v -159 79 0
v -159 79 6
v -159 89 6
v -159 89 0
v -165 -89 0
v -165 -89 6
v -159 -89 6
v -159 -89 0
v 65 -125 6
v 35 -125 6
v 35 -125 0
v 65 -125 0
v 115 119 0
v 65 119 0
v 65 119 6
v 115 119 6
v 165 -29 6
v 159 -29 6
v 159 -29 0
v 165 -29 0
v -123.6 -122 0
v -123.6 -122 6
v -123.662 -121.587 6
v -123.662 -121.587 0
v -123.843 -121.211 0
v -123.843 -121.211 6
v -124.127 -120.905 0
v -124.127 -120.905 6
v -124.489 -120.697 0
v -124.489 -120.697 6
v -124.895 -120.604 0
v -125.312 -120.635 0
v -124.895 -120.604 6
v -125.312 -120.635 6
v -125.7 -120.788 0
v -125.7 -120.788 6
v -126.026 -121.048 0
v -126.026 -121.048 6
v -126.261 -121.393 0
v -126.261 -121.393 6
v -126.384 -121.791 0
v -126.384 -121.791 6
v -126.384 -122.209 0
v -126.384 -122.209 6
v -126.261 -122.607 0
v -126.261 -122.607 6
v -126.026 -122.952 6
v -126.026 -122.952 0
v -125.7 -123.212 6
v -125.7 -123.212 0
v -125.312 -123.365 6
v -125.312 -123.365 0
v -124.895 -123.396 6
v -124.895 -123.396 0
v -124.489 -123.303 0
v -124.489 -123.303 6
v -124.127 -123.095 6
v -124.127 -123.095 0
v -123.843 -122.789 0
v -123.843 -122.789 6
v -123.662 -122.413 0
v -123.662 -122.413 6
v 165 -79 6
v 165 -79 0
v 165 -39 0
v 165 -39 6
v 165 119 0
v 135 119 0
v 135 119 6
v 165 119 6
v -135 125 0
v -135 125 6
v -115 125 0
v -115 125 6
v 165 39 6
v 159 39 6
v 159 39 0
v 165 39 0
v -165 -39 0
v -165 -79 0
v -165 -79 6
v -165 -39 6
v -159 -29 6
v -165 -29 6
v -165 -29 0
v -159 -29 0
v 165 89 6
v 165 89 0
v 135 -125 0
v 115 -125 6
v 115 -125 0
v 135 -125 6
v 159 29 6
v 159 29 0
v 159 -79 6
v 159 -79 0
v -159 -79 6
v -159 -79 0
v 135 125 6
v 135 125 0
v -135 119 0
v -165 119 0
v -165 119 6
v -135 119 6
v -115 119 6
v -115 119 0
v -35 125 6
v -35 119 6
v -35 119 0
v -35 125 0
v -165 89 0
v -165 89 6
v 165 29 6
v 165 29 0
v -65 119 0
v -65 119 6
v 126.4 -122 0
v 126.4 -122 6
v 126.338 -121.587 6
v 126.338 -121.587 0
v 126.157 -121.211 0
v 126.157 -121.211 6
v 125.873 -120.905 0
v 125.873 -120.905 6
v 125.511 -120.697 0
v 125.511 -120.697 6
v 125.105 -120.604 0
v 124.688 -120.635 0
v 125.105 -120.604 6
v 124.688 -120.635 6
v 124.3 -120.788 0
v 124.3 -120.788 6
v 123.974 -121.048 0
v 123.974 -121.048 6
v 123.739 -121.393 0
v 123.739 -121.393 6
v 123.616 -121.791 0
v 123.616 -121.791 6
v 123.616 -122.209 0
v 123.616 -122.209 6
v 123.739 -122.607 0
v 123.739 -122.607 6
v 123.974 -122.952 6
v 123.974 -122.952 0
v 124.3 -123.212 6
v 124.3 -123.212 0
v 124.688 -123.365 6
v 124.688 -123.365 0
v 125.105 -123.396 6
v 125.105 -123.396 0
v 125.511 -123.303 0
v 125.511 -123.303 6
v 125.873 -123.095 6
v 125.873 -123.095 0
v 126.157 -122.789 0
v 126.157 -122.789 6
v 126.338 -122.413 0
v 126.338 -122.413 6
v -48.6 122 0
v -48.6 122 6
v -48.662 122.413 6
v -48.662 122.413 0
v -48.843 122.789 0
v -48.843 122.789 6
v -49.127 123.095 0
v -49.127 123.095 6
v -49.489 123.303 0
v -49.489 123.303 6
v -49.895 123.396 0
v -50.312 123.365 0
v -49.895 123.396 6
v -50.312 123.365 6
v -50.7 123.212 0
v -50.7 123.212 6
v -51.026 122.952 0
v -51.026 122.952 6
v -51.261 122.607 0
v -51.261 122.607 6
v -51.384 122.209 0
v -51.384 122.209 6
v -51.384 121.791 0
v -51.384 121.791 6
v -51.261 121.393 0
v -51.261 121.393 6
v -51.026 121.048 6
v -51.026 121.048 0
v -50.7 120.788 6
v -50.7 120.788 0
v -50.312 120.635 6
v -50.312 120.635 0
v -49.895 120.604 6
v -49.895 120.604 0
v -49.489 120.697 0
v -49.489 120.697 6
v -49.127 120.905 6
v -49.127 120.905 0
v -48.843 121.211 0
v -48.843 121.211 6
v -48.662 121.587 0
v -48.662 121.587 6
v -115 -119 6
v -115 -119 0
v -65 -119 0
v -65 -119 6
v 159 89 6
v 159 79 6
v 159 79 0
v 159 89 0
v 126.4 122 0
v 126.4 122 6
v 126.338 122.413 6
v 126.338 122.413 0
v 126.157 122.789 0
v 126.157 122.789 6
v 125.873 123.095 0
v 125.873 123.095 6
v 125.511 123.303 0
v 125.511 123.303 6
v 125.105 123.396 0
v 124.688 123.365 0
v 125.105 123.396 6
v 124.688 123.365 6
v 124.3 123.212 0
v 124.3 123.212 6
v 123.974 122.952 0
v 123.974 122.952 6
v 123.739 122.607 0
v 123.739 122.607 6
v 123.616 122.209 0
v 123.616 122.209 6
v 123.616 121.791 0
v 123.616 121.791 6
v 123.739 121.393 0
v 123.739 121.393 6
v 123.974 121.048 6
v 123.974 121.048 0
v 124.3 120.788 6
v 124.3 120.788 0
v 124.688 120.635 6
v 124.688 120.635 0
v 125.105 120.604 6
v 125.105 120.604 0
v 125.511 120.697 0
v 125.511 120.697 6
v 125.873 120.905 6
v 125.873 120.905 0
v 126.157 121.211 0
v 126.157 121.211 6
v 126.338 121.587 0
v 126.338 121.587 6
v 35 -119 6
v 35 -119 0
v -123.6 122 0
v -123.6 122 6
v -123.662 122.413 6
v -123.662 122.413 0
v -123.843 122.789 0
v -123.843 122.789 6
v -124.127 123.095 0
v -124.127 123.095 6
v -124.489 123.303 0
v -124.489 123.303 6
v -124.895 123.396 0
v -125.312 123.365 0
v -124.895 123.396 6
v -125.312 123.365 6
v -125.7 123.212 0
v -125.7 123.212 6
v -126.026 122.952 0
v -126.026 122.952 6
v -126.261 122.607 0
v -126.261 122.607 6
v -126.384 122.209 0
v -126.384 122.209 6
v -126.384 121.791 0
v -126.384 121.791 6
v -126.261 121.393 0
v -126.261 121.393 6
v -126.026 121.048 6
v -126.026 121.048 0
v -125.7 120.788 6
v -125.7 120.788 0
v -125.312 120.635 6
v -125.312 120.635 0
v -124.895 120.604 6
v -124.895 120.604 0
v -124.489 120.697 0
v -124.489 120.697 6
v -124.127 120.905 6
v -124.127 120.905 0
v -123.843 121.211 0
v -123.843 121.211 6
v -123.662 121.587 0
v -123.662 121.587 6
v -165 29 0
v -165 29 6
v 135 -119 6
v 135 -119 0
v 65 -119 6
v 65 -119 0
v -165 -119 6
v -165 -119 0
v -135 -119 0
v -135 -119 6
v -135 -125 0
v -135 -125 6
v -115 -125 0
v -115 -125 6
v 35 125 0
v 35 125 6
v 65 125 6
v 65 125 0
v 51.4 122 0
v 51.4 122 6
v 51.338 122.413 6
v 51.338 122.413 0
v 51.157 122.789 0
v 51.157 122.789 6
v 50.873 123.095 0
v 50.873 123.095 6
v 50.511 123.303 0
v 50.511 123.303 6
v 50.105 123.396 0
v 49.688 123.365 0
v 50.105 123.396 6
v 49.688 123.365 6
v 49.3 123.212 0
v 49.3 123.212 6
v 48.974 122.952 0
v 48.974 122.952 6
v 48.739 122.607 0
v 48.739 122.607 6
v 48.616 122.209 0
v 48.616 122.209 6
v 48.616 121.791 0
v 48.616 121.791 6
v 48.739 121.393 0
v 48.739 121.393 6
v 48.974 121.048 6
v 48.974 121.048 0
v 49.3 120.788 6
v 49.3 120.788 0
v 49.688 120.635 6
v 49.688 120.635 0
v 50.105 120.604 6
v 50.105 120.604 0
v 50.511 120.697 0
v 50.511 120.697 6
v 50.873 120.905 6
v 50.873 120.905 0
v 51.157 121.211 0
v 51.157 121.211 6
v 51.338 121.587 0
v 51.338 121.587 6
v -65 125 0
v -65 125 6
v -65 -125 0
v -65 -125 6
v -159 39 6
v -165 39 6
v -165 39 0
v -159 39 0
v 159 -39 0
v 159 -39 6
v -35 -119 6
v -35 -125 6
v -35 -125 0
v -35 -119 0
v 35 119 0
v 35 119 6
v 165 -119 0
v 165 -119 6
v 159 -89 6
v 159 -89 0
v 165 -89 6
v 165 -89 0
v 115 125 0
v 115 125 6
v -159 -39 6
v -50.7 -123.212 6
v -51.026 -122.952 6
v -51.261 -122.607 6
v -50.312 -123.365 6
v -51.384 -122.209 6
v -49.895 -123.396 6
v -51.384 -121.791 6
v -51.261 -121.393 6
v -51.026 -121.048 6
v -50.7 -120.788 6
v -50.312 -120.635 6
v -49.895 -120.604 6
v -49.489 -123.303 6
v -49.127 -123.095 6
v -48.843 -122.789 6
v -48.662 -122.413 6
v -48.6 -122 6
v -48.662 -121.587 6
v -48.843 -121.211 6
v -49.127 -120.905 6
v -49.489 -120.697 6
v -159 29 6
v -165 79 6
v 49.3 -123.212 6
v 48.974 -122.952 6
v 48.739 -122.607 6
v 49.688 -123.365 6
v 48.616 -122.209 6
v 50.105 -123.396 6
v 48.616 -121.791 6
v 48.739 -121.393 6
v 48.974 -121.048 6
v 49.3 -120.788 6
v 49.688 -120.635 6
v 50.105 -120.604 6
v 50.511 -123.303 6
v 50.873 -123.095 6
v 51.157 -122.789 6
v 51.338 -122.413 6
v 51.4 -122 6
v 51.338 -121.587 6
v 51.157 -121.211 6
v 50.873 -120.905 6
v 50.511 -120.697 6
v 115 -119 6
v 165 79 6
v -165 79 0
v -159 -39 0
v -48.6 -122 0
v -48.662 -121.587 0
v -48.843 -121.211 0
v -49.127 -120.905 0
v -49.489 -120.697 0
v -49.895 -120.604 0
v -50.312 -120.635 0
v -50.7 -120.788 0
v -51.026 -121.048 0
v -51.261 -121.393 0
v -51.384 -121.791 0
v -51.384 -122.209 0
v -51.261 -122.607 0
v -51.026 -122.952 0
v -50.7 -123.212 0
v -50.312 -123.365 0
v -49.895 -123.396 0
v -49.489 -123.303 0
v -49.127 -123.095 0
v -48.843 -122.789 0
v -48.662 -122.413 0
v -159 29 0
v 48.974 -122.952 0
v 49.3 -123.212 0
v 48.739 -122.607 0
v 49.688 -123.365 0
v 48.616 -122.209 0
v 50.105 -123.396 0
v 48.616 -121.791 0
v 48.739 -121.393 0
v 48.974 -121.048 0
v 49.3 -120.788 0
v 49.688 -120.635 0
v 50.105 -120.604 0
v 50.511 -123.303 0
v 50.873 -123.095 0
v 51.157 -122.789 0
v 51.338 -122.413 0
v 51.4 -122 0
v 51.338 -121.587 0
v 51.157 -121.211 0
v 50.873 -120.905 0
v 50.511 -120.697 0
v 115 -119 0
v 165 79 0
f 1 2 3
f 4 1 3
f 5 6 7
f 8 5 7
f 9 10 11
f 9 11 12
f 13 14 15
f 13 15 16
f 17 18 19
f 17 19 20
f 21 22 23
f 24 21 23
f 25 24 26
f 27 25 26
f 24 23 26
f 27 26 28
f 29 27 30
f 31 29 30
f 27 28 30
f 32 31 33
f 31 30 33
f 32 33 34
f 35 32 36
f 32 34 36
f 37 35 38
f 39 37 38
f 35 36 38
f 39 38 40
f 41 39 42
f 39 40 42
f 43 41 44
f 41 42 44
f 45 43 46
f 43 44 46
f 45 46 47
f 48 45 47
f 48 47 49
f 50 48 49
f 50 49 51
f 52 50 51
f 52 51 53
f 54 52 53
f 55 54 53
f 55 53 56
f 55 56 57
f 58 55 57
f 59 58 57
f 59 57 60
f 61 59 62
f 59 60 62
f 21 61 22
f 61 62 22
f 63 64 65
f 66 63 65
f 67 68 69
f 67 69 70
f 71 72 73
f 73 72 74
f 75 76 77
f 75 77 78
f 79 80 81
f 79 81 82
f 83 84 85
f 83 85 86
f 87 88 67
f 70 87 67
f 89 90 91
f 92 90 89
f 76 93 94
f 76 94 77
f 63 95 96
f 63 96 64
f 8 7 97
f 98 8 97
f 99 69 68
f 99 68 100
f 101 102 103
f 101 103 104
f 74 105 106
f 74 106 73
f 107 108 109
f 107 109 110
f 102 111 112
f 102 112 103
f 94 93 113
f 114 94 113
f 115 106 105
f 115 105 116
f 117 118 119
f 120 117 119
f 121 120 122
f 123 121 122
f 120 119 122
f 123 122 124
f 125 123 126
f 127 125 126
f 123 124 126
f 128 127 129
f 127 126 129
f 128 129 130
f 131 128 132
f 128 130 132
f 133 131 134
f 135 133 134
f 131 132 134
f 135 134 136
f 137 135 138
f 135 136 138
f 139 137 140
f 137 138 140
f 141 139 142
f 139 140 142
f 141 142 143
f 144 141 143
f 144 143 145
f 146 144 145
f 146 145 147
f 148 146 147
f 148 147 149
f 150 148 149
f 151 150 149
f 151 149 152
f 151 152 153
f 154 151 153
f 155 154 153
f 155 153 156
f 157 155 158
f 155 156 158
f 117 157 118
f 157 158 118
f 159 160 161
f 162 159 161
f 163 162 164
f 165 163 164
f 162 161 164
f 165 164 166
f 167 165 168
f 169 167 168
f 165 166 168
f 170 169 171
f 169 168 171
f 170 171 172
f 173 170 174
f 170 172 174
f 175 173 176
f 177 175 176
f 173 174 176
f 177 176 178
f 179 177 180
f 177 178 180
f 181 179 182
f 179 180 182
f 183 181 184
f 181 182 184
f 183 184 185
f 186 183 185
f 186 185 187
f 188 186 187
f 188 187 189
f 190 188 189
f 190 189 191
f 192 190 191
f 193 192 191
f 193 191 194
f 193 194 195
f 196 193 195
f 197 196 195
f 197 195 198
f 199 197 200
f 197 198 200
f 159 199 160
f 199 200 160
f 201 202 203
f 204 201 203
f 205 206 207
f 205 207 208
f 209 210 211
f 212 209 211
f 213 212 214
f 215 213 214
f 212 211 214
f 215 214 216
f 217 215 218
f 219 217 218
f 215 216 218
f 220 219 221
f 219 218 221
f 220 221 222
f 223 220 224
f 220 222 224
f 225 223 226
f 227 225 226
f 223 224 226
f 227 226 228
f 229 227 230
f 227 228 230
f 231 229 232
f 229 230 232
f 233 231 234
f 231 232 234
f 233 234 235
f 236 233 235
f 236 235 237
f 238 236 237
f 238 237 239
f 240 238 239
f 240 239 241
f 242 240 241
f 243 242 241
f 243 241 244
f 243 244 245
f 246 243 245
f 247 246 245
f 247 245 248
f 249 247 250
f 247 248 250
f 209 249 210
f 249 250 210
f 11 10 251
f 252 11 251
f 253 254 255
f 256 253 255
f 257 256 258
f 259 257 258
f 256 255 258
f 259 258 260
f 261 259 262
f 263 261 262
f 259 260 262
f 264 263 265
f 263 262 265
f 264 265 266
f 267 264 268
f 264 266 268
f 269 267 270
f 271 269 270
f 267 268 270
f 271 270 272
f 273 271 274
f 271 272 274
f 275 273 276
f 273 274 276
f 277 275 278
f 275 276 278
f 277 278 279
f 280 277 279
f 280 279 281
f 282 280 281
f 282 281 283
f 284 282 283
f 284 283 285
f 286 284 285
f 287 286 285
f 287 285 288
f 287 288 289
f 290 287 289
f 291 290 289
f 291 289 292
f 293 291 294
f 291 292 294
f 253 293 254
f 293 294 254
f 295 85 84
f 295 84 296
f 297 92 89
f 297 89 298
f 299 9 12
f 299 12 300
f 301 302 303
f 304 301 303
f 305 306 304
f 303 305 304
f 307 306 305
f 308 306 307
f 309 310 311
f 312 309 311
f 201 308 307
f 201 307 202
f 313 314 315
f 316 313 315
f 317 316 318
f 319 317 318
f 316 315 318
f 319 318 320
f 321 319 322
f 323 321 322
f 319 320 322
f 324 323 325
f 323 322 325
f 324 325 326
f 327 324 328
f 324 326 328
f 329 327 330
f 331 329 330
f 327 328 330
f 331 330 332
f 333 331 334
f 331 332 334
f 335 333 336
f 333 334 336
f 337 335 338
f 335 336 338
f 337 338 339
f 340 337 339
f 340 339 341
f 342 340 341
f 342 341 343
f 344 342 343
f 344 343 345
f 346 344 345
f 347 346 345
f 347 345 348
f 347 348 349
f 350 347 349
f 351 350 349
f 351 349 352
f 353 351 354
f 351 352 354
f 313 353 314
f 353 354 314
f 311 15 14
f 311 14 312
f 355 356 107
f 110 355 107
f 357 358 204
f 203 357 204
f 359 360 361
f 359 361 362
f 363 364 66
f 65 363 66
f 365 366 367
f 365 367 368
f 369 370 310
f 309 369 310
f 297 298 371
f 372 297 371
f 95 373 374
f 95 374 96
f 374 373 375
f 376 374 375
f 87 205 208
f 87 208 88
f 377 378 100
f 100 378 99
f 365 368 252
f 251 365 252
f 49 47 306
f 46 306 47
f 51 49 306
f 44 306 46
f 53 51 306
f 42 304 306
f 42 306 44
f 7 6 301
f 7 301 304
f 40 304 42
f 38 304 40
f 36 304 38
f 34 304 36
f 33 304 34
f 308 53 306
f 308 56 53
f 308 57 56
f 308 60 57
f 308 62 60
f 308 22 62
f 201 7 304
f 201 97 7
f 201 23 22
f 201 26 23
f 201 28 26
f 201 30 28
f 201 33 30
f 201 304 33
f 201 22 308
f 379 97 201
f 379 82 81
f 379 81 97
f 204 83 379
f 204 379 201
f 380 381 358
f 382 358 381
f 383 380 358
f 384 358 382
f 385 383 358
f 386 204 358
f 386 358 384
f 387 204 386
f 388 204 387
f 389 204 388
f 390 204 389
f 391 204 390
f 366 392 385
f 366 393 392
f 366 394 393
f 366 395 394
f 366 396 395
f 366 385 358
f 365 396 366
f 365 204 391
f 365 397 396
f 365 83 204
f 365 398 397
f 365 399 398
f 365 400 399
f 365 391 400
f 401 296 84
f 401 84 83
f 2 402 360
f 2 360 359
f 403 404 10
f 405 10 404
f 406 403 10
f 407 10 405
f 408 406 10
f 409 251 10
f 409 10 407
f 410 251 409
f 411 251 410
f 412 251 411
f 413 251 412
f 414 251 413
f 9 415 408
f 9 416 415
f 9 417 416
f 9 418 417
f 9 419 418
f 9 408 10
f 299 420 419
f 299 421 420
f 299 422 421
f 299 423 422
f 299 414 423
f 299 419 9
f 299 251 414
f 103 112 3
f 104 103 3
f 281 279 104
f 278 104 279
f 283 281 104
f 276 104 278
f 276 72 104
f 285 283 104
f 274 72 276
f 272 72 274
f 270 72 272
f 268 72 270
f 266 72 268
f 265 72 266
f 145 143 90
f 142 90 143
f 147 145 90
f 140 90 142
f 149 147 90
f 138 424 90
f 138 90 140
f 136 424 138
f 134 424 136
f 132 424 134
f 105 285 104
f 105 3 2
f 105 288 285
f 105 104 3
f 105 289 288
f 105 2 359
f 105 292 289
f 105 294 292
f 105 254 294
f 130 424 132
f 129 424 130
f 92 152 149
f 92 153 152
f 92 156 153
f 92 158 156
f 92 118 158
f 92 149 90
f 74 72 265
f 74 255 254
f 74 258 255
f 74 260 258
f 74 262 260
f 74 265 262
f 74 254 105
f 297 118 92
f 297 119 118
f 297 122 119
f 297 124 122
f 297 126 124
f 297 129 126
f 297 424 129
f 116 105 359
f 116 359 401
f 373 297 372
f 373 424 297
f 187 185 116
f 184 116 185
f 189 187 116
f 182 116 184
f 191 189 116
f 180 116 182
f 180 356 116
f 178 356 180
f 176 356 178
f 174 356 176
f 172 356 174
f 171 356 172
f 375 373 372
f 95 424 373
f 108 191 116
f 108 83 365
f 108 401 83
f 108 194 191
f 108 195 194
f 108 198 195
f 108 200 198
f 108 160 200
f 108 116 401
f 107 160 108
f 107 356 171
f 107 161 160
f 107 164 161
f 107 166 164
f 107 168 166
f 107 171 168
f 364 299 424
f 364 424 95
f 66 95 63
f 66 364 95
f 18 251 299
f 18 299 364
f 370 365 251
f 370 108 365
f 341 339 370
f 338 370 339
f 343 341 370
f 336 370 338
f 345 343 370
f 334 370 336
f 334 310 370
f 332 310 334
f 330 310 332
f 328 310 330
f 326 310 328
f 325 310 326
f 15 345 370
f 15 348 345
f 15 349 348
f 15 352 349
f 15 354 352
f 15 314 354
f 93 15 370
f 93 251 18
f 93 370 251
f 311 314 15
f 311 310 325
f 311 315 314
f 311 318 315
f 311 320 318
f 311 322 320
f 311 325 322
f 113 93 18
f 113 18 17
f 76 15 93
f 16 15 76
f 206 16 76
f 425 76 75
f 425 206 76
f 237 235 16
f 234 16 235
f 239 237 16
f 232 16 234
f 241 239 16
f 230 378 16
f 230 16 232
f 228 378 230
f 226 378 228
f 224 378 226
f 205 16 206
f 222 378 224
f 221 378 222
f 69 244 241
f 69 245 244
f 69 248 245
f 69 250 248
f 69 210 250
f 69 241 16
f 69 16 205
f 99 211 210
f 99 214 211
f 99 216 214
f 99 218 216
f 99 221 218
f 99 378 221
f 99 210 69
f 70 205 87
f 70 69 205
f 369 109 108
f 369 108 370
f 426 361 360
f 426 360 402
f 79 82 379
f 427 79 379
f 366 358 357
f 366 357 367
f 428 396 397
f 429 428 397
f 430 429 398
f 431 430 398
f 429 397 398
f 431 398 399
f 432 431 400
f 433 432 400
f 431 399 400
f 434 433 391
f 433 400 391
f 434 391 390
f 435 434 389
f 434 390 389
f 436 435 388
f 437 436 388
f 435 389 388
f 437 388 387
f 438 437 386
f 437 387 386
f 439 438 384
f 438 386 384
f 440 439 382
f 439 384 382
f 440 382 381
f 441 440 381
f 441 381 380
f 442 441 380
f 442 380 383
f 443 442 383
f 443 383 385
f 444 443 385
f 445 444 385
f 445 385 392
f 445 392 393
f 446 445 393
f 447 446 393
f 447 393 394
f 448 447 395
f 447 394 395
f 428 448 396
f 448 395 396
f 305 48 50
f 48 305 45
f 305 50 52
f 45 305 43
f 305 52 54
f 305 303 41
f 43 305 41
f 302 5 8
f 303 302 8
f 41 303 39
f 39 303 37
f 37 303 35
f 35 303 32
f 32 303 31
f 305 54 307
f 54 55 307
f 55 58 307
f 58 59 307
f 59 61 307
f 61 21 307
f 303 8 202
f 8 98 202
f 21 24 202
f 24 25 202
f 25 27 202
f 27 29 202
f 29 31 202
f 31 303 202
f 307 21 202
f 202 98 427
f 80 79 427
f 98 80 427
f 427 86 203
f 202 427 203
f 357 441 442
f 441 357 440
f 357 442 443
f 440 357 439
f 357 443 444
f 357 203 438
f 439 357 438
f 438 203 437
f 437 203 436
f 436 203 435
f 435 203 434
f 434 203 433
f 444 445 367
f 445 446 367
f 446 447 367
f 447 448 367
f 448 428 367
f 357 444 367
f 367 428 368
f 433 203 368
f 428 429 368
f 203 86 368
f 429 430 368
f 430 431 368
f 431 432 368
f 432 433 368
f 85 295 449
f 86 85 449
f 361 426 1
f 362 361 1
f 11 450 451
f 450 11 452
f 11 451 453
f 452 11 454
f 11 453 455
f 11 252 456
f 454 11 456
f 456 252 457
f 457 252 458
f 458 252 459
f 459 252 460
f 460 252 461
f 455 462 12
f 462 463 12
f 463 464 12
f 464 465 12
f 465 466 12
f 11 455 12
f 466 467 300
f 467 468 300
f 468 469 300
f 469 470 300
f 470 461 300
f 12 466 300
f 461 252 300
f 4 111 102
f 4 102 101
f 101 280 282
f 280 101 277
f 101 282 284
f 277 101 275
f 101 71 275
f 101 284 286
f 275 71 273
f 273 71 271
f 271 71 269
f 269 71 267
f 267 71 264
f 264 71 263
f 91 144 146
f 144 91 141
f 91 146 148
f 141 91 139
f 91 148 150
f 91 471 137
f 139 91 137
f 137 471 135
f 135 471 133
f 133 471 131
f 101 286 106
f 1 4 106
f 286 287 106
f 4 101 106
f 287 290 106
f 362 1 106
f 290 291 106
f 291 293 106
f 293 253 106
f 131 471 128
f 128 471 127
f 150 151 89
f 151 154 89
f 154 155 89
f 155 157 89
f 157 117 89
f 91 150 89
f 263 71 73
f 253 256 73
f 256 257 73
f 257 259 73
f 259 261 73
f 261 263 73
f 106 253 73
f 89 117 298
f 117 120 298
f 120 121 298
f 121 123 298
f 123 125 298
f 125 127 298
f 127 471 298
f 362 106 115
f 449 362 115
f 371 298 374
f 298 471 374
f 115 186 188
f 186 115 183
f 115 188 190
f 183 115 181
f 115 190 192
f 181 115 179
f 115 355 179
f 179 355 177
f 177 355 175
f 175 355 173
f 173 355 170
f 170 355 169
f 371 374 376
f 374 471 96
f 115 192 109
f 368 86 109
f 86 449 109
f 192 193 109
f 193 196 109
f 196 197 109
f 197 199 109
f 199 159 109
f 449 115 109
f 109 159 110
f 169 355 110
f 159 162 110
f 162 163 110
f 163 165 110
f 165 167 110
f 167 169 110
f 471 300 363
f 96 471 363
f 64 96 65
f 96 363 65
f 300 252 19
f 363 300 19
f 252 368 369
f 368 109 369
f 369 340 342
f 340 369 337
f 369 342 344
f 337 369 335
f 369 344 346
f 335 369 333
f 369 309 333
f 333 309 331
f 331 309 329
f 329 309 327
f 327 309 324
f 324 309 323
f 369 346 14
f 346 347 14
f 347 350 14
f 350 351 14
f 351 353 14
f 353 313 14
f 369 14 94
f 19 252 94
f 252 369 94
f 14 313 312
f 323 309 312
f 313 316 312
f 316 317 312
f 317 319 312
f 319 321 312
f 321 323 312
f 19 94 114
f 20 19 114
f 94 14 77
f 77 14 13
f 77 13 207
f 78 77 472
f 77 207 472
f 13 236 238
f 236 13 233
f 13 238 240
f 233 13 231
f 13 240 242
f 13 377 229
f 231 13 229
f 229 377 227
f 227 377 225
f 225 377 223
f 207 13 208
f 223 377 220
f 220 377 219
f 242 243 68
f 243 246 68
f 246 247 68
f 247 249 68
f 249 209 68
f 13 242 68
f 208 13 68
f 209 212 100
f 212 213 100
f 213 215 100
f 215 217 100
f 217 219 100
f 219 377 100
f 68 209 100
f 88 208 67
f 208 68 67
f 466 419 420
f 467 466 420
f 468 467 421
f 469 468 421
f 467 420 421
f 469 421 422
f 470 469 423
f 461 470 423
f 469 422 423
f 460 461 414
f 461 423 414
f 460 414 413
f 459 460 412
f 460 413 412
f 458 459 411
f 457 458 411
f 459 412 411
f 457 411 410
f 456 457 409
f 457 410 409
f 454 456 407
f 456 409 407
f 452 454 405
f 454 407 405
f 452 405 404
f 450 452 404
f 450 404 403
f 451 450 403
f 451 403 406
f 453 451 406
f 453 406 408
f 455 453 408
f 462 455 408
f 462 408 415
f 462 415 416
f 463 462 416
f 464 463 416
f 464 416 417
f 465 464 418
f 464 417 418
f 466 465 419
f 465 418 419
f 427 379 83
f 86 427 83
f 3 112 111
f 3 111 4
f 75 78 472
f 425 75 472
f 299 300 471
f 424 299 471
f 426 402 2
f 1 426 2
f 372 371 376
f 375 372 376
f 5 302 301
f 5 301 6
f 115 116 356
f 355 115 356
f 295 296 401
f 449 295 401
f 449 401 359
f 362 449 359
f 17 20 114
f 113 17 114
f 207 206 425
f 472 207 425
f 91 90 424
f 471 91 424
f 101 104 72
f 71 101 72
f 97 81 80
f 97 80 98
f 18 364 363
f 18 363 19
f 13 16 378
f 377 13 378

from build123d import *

# Parameters (mm, degrees)
ESQUISSE1_W             = 330
ESQUISSE1_H             = 238
BOSS_EXTRU_1_DEPTH      = 6
ESQUISSE2_W             = 20
ESQUISSE2_H             = 6
ESQUISSE2_W_2           = 30
BOSS_EXTRU_2_DEPTH      = 6
ESQUISSE3_W             = 6
ESQUISSE3_H             = 10
ENL_V_MAT_EXTRU_1_DEPTH = 6
ESQUISSE4_R             = 1.4
ENL_V_MAT_EXTRU_2_DEPTH = 6


with BuildPart() as part:
    # Esquisse1 → Boss.-Extru.1 (new body)
    with BuildSketch(Plane.XY):
        Rectangle(ESQUISSE1_W, ESQUISSE1_H)
    extrude(amount=BOSS_EXTRU_1_DEPTH)

    # Esquisse2 → Boss.-Extru.2 (add)
    with BuildSketch(Plane.XY.offset(6)):
        with Locations((-125, 122)):
            Rectangle(ESQUISSE2_W, ESQUISSE2_H)
        with Locations((-50, 122)):
            Rectangle(ESQUISSE2_W_2, ESQUISSE2_H)
        with Locations((50, 122)):
            Rectangle(ESQUISSE2_W_2, ESQUISSE2_H)
        with Locations((125, 122)):
            Rectangle(ESQUISSE2_W, ESQUISSE2_H)
        with Locations((125, -122)):
            Rectangle(ESQUISSE2_W, ESQUISSE2_H)
        with Locations((50, -122)):
            Rectangle(ESQUISSE2_W_2, ESQUISSE2_H)
        with Locations((-50, -122)):
            Rectangle(ESQUISSE2_W_2, ESQUISSE2_H)
        with Locations((-125, -122)):
            Rectangle(ESQUISSE2_W, ESQUISSE2_H)
    extrude(amount=-BOSS_EXTRU_2_DEPTH)

    # Esquisse3 → Enlèv. mat.-Extru.1 (cut)
    with BuildSketch(Plane.XY.offset(6)):
        with Locations((-162, 84)):
            Rectangle(ESQUISSE3_W, ESQUISSE3_H)
        with Locations((-162, 34)):
            Rectangle(ESQUISSE3_W, ESQUISSE3_H)
        with Locations((-162, -34)):
            Rectangle(ESQUISSE3_W, ESQUISSE3_H)
        with Locations((-162, -84)):
            Rectangle(ESQUISSE3_W, ESQUISSE3_H)
        with Locations((162, -84)):
            Rectangle(ESQUISSE3_W, ESQUISSE3_H)
        with Locations((162, -34)):
            Rectangle(ESQUISSE3_W, ESQUISSE3_H)
        with Locations((162, 34)):
            Rectangle(ESQUISSE3_W, ESQUISSE3_H)
        with Locations((162, 84)):
            Rectangle(ESQUISSE3_W, ESQUISSE3_H)
    extrude(amount=-ENL_V_MAT_EXTRU_1_DEPTH, mode=Mode.SUBTRACT)

    # Esquisse4 → Enlèv. mat.-Extru.2 (cut)
    with BuildSketch(Plane.XY.offset(6)):
        with Locations((-125, 122)):
            Circle(ESQUISSE4_R)
        with Locations((-50, 122)):
            Circle(ESQUISSE4_R)
        with Locations((50, 122)):
            Circle(ESQUISSE4_R)
        with Locations((125, 122)):
            Circle(ESQUISSE4_R)
        with Locations((125, -122)):
            Circle(ESQUISSE4_R)
        with Locations((50, -122)):
            Circle(ESQUISSE4_R)
        with Locations((-50, -122)):
            Circle(ESQUISSE4_R)
        with Locations((-125, -122)):
            Circle(ESQUISSE4_R)
    extrude(amount=-ENL_V_MAT_EXTRU_2_DEPTH, mode=Mode.SUBTRACT)


solid = part.part
